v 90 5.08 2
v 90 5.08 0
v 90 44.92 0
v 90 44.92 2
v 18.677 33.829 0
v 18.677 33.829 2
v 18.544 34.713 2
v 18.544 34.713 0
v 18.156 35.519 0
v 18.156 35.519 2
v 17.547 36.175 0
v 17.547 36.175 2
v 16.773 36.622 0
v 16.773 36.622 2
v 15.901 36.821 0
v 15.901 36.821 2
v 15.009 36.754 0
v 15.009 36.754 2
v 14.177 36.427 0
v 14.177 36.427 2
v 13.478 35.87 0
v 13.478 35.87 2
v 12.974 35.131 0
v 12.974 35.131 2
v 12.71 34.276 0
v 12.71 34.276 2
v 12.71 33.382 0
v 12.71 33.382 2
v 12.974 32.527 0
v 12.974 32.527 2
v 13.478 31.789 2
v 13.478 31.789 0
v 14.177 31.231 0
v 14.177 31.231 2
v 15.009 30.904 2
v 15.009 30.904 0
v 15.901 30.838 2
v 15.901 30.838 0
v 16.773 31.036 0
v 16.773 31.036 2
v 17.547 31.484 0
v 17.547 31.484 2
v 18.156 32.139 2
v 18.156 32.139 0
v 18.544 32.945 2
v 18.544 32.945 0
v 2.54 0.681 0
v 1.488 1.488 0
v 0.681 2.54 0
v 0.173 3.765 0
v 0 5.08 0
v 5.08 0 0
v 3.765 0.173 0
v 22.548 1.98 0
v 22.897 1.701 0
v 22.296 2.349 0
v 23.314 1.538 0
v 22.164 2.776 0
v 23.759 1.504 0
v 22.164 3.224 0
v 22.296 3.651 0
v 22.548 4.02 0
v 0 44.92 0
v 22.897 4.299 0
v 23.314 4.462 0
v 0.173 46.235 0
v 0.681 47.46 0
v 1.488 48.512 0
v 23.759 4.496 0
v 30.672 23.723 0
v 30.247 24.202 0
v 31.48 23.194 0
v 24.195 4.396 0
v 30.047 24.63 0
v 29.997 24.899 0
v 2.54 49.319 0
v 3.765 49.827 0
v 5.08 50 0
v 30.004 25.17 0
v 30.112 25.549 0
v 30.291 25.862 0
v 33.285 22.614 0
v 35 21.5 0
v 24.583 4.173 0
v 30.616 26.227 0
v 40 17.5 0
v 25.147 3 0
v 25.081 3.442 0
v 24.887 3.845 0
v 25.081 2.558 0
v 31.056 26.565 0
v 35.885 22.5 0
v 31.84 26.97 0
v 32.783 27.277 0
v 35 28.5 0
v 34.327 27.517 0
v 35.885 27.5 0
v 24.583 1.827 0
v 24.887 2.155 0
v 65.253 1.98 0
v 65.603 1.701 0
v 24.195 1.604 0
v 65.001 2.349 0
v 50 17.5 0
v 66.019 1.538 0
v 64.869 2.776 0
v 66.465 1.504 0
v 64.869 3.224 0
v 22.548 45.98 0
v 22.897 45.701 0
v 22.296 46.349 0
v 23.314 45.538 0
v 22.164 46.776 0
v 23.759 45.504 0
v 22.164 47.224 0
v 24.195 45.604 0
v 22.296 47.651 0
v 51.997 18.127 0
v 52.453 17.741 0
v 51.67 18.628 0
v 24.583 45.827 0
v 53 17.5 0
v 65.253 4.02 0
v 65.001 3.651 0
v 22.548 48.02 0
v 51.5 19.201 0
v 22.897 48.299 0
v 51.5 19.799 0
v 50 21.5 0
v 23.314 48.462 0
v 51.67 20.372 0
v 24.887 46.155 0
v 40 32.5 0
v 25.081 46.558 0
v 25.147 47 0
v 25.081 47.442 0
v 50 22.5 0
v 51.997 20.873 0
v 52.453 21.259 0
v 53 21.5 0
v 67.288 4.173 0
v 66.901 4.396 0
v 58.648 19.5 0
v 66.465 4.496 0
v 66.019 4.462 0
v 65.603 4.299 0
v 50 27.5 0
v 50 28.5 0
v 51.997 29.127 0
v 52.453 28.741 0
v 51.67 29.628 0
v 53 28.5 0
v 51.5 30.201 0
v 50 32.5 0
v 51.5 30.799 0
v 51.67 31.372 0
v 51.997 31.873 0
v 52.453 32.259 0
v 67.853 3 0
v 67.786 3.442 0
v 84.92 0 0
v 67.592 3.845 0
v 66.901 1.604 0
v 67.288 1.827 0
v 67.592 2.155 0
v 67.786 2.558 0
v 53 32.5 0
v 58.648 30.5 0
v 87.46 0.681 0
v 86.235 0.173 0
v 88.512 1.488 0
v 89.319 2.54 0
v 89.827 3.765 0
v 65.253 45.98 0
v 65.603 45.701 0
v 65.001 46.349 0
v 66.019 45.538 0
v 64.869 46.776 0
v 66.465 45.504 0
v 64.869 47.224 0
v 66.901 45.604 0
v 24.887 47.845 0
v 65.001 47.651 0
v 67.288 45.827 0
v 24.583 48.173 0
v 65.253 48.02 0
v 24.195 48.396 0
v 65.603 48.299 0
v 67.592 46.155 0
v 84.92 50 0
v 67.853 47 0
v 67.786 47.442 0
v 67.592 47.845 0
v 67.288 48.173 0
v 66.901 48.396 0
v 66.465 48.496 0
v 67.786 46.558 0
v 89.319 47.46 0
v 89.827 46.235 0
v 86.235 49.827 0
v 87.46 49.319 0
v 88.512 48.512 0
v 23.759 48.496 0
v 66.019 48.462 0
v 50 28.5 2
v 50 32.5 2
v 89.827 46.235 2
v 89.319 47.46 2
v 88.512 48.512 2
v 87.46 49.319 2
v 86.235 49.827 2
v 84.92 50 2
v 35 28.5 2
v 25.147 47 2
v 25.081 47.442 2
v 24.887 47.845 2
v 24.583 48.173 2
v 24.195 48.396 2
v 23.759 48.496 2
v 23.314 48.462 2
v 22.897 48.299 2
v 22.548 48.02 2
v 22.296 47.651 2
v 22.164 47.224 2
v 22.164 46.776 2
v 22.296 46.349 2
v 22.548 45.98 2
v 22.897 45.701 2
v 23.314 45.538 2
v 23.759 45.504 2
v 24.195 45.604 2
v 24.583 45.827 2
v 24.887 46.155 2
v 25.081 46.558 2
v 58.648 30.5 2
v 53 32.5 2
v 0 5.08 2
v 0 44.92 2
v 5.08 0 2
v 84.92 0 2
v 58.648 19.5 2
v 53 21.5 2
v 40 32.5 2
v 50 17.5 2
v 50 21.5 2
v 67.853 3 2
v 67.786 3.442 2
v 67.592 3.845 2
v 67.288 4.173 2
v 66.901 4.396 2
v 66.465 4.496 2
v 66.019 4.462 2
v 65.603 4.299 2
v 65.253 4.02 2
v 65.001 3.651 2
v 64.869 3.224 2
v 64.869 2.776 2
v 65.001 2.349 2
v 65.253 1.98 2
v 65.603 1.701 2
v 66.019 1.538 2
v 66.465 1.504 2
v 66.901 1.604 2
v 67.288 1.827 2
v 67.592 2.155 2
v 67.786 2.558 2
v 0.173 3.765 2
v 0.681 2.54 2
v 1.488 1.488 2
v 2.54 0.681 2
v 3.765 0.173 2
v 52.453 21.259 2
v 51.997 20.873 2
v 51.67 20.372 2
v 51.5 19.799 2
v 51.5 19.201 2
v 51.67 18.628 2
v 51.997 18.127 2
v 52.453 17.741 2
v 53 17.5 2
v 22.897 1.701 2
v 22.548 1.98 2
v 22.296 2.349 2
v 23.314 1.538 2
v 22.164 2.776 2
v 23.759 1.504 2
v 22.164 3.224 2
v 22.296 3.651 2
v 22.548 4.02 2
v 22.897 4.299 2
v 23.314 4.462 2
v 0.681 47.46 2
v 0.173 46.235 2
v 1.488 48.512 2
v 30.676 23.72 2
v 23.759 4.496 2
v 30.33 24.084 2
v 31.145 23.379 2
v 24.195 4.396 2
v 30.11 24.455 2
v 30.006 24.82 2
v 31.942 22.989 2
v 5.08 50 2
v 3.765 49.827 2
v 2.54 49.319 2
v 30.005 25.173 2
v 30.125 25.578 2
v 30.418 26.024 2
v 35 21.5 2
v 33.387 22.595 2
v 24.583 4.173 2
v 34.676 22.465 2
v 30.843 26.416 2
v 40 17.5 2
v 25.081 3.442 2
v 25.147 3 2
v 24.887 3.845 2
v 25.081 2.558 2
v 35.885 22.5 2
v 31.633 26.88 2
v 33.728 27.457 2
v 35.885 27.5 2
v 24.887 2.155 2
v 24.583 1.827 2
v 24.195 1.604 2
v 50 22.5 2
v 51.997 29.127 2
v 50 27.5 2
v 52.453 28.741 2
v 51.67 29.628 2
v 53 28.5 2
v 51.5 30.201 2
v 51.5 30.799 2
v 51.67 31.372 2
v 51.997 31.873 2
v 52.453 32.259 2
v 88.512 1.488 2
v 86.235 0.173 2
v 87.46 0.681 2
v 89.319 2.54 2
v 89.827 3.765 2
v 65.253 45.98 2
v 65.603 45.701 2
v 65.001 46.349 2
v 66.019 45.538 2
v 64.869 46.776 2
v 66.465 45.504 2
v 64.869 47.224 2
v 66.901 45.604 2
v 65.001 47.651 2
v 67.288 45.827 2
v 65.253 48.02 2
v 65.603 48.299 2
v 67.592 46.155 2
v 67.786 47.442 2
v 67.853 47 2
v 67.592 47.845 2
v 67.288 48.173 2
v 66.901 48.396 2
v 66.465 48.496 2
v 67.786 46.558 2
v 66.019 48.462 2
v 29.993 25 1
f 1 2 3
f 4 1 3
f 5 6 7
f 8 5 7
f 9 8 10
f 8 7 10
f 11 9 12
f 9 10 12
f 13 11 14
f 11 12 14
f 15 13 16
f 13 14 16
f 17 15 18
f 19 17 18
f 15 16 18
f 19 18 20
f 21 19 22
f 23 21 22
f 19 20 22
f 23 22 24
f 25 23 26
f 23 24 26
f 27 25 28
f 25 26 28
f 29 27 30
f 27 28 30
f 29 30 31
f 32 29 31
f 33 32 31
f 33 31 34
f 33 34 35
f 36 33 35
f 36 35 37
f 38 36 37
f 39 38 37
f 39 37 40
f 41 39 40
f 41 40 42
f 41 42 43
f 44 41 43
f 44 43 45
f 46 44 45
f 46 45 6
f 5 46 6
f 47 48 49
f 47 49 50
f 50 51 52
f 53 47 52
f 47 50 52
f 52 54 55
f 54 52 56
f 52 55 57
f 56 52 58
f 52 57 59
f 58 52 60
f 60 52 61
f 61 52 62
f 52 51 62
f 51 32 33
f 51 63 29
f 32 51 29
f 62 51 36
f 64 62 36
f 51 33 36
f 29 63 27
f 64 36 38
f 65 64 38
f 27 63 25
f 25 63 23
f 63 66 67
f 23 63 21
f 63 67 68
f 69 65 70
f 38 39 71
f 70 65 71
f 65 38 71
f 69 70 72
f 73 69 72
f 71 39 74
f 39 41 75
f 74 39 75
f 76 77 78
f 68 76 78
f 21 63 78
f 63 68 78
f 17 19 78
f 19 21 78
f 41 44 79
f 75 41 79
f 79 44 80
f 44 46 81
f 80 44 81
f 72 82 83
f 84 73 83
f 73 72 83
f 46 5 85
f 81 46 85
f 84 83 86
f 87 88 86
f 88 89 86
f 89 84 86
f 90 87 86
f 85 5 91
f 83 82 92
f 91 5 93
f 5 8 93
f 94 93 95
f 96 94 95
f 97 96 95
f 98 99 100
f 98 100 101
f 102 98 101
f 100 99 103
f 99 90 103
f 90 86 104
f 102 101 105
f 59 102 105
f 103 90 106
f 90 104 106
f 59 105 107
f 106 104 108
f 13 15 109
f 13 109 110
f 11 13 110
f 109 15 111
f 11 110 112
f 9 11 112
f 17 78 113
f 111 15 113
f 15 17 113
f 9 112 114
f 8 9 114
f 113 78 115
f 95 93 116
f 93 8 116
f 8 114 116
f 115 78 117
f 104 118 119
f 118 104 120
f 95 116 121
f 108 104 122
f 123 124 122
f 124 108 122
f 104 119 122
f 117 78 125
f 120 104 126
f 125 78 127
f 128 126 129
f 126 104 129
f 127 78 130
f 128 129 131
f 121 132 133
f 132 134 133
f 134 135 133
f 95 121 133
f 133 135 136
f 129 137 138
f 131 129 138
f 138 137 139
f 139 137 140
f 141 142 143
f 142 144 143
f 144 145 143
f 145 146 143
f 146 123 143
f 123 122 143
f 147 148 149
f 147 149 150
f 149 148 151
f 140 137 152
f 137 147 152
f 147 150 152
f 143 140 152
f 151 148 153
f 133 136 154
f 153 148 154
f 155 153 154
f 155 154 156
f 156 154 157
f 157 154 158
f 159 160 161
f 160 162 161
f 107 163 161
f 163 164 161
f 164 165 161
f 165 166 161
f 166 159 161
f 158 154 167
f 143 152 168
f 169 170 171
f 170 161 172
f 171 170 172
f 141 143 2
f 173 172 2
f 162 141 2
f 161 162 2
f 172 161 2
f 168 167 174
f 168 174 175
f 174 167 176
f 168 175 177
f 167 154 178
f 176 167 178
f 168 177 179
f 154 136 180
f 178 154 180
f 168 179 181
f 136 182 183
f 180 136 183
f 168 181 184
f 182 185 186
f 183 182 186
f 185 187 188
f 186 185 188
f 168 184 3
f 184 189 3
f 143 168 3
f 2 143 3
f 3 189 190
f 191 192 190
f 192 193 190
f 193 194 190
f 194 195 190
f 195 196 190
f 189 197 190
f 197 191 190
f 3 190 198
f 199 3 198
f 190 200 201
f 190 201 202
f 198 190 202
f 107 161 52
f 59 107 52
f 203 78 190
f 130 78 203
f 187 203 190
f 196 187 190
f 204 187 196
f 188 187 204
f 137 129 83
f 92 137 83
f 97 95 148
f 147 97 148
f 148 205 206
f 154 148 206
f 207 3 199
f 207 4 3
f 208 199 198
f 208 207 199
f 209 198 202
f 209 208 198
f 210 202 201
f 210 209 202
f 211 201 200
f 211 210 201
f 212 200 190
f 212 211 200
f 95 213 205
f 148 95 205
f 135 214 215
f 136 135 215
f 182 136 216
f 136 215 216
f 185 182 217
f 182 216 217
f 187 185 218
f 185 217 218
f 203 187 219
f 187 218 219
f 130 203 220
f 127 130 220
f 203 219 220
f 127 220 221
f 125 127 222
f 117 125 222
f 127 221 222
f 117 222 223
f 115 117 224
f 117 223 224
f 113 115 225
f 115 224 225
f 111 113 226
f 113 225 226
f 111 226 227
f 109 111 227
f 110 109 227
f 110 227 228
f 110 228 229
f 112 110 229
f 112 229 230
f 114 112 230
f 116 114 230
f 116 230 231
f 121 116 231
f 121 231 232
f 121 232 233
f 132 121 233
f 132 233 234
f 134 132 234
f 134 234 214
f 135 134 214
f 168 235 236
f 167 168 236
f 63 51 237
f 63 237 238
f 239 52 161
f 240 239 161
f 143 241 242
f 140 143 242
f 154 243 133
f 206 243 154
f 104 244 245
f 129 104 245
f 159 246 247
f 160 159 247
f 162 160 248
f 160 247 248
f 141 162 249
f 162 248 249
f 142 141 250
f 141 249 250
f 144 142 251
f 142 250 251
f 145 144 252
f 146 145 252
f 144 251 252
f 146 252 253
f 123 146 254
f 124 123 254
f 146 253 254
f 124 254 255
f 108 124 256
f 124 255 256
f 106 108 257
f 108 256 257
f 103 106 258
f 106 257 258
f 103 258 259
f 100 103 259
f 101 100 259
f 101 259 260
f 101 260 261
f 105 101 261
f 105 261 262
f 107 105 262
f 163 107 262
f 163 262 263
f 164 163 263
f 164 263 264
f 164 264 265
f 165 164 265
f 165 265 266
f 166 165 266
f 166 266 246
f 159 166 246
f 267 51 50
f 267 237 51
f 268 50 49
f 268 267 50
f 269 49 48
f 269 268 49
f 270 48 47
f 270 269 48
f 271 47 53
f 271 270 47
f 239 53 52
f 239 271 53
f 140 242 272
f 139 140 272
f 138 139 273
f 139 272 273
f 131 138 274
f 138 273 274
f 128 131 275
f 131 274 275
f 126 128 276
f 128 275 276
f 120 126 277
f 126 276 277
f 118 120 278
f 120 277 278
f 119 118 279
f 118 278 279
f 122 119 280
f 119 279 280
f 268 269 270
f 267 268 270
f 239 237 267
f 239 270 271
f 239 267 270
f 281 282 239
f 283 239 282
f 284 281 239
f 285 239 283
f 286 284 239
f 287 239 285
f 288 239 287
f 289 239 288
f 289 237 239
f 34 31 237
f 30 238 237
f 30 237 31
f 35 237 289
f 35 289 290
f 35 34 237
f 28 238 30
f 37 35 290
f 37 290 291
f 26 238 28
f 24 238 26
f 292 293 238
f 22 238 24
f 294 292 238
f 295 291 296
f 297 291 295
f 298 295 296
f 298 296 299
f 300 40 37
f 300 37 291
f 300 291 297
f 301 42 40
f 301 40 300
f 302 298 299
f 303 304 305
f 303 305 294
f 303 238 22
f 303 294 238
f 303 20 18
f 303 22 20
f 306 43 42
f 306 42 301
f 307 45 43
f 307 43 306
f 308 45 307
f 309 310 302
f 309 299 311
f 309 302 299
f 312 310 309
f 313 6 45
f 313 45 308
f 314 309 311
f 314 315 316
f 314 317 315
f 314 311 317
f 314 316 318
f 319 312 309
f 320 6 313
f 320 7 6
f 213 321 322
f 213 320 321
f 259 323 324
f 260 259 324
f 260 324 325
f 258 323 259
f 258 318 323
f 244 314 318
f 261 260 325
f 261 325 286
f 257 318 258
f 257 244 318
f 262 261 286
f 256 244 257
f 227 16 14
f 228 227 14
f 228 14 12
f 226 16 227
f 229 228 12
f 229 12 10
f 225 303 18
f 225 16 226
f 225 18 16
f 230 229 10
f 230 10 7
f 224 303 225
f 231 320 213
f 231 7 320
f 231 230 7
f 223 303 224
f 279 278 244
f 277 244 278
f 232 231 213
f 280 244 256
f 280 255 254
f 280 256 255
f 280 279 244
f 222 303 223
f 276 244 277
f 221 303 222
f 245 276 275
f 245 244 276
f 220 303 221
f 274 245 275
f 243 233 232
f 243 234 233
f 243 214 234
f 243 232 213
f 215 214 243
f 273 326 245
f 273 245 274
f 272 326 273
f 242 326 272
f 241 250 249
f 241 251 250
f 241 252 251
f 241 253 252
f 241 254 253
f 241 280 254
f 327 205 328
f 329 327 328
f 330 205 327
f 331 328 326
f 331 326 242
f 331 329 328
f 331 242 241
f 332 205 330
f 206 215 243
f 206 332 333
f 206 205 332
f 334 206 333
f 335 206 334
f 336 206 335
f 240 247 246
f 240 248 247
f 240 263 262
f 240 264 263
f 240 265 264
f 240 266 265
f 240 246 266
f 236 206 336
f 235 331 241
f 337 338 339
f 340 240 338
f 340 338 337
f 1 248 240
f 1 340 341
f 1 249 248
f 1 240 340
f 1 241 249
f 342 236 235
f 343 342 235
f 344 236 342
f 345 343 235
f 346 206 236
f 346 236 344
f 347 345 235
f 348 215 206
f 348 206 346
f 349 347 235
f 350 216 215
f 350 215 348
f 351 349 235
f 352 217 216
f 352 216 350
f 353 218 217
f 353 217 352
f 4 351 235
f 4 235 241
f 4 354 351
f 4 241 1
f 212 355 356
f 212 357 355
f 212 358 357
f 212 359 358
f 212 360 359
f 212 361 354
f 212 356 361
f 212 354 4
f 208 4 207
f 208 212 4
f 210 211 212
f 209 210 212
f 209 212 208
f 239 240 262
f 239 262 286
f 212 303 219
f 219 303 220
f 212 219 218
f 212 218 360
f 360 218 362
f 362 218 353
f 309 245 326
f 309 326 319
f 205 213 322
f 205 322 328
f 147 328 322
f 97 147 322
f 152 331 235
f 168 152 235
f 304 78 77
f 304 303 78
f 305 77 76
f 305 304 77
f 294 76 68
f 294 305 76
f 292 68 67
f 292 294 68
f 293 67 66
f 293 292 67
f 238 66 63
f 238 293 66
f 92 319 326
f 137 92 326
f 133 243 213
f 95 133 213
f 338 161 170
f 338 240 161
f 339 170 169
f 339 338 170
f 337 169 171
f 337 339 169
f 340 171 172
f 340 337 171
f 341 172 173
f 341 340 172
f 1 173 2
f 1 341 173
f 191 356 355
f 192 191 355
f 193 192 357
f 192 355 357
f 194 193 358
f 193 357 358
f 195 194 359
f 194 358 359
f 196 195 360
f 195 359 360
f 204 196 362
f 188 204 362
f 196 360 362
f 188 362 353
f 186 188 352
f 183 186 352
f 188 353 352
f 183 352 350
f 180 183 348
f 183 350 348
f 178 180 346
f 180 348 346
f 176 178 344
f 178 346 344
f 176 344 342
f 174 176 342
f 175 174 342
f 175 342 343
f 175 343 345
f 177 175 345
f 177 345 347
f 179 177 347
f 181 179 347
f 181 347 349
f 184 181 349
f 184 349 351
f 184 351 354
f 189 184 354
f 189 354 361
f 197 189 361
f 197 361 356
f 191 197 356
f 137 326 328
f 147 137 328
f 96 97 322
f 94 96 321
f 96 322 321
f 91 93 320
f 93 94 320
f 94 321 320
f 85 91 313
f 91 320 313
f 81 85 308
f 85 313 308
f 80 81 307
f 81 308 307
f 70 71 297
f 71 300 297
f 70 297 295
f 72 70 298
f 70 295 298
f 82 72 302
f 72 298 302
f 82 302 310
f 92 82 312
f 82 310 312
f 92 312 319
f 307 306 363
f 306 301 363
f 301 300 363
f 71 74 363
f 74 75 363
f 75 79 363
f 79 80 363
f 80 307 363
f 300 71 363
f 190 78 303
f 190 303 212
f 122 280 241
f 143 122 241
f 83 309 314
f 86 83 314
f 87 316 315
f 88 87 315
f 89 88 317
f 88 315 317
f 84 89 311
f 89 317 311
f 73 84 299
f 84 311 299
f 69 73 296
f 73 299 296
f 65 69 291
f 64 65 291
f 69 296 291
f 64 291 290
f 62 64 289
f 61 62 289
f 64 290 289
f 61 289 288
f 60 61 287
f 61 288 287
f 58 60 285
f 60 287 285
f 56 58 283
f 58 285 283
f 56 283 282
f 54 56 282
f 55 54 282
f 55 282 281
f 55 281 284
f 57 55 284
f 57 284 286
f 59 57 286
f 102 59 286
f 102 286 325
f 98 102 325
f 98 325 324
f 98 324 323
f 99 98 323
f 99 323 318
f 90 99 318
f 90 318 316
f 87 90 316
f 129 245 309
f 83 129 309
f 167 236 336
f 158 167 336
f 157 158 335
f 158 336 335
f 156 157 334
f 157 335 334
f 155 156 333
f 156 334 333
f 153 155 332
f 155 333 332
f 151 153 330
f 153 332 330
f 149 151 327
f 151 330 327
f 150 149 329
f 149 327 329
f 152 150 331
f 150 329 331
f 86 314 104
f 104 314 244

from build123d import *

# Parameters (mm, degrees)
F0_W      = 90
F0_H      = 50
F1_DEPTH  = 2
F3_R      = 5.08
F4_R      = 5.08
F5_R      = 5.08
F6_R      = 5.08
F8_W      = 10
F8_H      = 4
F9_DEPTH  = 25.4
F10_R     = 1.5
F11_DEPTH = 25.4
F12_R     = 3
F13_DEPTH = 25.4


with BuildPart() as f1:
    # F0 (on Top) → F1 (new body)
    with BuildSketch(Plane.XY):
        with Locations((45, 25)):
            Rectangle(F0_W, F0_H)
    extrude(amount=F1_DEPTH)

    # F3
    f3_edges = [f1.edges().sort_by_distance(p)[0] for p in [
        (90, 0, 1),
    ]]
    fillet(f3_edges, radius=F3_R)

    # F4
    f4_edges = [f1.edges().sort_by_distance(p)[0] for p in [
        (90, 50, 1),
    ]]
    fillet(f4_edges, radius=F4_R)

    # F5
    f5_edges = [f1.edges().sort_by_distance(p)[0] for p in [
        (0, 50, 1),
    ]]
    fillet(f5_edges, radius=F5_R)

    # F6
    f6_edges = [f1.edges().sort_by_distance(p)[0] for p in [
        (0, 0, 1),
    ]]
    fillet(f6_edges, radius=F6_R)

    # F8 (on offset) → F9 (cut)
    with BuildSketch(Plane.XY.offset(2)):
        with BuildLine():
            Line((35, 22.5), (35, 27.5))
            Line((35, 27.5), (35.8850657517, 27.5))
            add(Edge.make_bspline(
                [(35.8850657517, 27.5), (29.9931568267, 28.0368228686), (29.9931568267, 25)],
                knots=[4.5346839474, 4.5346839474, 4.5346839474, 6.2831853072, 6.2831853072, 6.2831853072], degree=2, weights=[1, 0.6415718139, 1]))
            add(Edge.make_bspline(
                [(29.9931568267, 25), (29.9931568267, 21.9631771314), (35.8850657517, 22.5)],
                knots=[0, 0, 0, 1.7485013598, 1.7485013598, 1.7485013598], degree=2, weights=[1, 0.6415718139, 1]))
            Line((35.8850657517, 22.5), (35, 22.5))
        make_face()
        with BuildLine():
            Line((35.8850657517, 27.5), (35, 27.5))
            Line((35, 27.5), (35, 22.5))
            Line((35, 22.5), (35.8850657517, 22.5))
            add(Edge.make_bspline(
                [(35.8850657517, 22.5), (40.0068431733, 22.8755428686), (40.0068431733, 25), (40.0068431733, 27.1244571314), (35.8850657517, 27.5)],
                knots=[1.7485013598, 1.7485013598, 1.7485013598, 3.1415926536, 3.1415926536, 4.5346839474, 4.5346839474, 4.5346839474], degree=2, weights=[1, 0.767062975, 1, 0.767062975, 1]))
        make_face()
        with BuildLine():
            Line((50, 27.5), (35.8850657517, 27.5))
            add(Edge.make_bspline(
                [(35.8850657517, 22.5), (40.0068431733, 22.8755428686), (40.0068431733, 25), (40.0068431733, 27.1244571314), (35.8850657517, 27.5)],
                knots=[1.7485013598, 1.7485013598, 1.7485013598, 3.1415926536, 3.1415926536, 4.5346839474, 4.5346839474, 4.5346839474], degree=2, weights=[1, 0.767062975, 1, 0.767062975, 1]))
            Line((35.8850657517, 22.5), (50, 22.5))
            Line((50, 22.5), (50, 27.5))
        make_face()
        with Locations((45, 30.5)):
            Rectangle(F8_W, F8_H)
        Polygon((40, 28.5), (40, 32.5), (35, 28.5), align=None)
        Polygon((35, 21.5), (40, 17.5), (40, 21.5), align=None)
        with Locations((45, 19.5)):
            Rectangle(F8_W, F8_H)
        with BuildLine():
            Line((58.6482731998, 30.5), (53, 32.5))
            ThreePointArc((53, 32.5), (51.4781820371, 30.5), (53, 28.5))
            Line((53, 28.5), (58.6482731998, 30.5))
        make_face()
        with BuildLine():
            ThreePointArc((53, 21.5), (51.4781820371, 19.5), (53, 17.5))
            Line((53, 17.5), (58.6482731998, 19.5))
            Line((58.6482731998, 19.5), (53, 21.5))
        make_face()
    extrude(amount=-F9_DEPTH, mode=Mode.SUBTRACT)

    # F10 (on offset) → F11 (cut)
    with BuildSketch(Plane.XY.offset(2)):
        with Locations((23.6474, 3)):
            Circle(F10_R)
        with Locations((66.3526, 3)):
            Circle(F10_R)
        with Locations((23.6474, 47)):
            Circle(F10_R)
        with Locations((66.3526, 47)):
            Circle(F10_R)
    extrude(amount=-F11_DEPTH, mode=Mode.SUBTRACT)

    # F12 (on offset) → F13 (cut)
    with BuildSketch(Plane.XY.offset(2)):
        with Locations((15.6768597662, 33.8291116059)):
            Circle(F12_R)
    extrude(amount=-F13_DEPTH, mode=Mode.SUBTRACT)


solid = f1.part
